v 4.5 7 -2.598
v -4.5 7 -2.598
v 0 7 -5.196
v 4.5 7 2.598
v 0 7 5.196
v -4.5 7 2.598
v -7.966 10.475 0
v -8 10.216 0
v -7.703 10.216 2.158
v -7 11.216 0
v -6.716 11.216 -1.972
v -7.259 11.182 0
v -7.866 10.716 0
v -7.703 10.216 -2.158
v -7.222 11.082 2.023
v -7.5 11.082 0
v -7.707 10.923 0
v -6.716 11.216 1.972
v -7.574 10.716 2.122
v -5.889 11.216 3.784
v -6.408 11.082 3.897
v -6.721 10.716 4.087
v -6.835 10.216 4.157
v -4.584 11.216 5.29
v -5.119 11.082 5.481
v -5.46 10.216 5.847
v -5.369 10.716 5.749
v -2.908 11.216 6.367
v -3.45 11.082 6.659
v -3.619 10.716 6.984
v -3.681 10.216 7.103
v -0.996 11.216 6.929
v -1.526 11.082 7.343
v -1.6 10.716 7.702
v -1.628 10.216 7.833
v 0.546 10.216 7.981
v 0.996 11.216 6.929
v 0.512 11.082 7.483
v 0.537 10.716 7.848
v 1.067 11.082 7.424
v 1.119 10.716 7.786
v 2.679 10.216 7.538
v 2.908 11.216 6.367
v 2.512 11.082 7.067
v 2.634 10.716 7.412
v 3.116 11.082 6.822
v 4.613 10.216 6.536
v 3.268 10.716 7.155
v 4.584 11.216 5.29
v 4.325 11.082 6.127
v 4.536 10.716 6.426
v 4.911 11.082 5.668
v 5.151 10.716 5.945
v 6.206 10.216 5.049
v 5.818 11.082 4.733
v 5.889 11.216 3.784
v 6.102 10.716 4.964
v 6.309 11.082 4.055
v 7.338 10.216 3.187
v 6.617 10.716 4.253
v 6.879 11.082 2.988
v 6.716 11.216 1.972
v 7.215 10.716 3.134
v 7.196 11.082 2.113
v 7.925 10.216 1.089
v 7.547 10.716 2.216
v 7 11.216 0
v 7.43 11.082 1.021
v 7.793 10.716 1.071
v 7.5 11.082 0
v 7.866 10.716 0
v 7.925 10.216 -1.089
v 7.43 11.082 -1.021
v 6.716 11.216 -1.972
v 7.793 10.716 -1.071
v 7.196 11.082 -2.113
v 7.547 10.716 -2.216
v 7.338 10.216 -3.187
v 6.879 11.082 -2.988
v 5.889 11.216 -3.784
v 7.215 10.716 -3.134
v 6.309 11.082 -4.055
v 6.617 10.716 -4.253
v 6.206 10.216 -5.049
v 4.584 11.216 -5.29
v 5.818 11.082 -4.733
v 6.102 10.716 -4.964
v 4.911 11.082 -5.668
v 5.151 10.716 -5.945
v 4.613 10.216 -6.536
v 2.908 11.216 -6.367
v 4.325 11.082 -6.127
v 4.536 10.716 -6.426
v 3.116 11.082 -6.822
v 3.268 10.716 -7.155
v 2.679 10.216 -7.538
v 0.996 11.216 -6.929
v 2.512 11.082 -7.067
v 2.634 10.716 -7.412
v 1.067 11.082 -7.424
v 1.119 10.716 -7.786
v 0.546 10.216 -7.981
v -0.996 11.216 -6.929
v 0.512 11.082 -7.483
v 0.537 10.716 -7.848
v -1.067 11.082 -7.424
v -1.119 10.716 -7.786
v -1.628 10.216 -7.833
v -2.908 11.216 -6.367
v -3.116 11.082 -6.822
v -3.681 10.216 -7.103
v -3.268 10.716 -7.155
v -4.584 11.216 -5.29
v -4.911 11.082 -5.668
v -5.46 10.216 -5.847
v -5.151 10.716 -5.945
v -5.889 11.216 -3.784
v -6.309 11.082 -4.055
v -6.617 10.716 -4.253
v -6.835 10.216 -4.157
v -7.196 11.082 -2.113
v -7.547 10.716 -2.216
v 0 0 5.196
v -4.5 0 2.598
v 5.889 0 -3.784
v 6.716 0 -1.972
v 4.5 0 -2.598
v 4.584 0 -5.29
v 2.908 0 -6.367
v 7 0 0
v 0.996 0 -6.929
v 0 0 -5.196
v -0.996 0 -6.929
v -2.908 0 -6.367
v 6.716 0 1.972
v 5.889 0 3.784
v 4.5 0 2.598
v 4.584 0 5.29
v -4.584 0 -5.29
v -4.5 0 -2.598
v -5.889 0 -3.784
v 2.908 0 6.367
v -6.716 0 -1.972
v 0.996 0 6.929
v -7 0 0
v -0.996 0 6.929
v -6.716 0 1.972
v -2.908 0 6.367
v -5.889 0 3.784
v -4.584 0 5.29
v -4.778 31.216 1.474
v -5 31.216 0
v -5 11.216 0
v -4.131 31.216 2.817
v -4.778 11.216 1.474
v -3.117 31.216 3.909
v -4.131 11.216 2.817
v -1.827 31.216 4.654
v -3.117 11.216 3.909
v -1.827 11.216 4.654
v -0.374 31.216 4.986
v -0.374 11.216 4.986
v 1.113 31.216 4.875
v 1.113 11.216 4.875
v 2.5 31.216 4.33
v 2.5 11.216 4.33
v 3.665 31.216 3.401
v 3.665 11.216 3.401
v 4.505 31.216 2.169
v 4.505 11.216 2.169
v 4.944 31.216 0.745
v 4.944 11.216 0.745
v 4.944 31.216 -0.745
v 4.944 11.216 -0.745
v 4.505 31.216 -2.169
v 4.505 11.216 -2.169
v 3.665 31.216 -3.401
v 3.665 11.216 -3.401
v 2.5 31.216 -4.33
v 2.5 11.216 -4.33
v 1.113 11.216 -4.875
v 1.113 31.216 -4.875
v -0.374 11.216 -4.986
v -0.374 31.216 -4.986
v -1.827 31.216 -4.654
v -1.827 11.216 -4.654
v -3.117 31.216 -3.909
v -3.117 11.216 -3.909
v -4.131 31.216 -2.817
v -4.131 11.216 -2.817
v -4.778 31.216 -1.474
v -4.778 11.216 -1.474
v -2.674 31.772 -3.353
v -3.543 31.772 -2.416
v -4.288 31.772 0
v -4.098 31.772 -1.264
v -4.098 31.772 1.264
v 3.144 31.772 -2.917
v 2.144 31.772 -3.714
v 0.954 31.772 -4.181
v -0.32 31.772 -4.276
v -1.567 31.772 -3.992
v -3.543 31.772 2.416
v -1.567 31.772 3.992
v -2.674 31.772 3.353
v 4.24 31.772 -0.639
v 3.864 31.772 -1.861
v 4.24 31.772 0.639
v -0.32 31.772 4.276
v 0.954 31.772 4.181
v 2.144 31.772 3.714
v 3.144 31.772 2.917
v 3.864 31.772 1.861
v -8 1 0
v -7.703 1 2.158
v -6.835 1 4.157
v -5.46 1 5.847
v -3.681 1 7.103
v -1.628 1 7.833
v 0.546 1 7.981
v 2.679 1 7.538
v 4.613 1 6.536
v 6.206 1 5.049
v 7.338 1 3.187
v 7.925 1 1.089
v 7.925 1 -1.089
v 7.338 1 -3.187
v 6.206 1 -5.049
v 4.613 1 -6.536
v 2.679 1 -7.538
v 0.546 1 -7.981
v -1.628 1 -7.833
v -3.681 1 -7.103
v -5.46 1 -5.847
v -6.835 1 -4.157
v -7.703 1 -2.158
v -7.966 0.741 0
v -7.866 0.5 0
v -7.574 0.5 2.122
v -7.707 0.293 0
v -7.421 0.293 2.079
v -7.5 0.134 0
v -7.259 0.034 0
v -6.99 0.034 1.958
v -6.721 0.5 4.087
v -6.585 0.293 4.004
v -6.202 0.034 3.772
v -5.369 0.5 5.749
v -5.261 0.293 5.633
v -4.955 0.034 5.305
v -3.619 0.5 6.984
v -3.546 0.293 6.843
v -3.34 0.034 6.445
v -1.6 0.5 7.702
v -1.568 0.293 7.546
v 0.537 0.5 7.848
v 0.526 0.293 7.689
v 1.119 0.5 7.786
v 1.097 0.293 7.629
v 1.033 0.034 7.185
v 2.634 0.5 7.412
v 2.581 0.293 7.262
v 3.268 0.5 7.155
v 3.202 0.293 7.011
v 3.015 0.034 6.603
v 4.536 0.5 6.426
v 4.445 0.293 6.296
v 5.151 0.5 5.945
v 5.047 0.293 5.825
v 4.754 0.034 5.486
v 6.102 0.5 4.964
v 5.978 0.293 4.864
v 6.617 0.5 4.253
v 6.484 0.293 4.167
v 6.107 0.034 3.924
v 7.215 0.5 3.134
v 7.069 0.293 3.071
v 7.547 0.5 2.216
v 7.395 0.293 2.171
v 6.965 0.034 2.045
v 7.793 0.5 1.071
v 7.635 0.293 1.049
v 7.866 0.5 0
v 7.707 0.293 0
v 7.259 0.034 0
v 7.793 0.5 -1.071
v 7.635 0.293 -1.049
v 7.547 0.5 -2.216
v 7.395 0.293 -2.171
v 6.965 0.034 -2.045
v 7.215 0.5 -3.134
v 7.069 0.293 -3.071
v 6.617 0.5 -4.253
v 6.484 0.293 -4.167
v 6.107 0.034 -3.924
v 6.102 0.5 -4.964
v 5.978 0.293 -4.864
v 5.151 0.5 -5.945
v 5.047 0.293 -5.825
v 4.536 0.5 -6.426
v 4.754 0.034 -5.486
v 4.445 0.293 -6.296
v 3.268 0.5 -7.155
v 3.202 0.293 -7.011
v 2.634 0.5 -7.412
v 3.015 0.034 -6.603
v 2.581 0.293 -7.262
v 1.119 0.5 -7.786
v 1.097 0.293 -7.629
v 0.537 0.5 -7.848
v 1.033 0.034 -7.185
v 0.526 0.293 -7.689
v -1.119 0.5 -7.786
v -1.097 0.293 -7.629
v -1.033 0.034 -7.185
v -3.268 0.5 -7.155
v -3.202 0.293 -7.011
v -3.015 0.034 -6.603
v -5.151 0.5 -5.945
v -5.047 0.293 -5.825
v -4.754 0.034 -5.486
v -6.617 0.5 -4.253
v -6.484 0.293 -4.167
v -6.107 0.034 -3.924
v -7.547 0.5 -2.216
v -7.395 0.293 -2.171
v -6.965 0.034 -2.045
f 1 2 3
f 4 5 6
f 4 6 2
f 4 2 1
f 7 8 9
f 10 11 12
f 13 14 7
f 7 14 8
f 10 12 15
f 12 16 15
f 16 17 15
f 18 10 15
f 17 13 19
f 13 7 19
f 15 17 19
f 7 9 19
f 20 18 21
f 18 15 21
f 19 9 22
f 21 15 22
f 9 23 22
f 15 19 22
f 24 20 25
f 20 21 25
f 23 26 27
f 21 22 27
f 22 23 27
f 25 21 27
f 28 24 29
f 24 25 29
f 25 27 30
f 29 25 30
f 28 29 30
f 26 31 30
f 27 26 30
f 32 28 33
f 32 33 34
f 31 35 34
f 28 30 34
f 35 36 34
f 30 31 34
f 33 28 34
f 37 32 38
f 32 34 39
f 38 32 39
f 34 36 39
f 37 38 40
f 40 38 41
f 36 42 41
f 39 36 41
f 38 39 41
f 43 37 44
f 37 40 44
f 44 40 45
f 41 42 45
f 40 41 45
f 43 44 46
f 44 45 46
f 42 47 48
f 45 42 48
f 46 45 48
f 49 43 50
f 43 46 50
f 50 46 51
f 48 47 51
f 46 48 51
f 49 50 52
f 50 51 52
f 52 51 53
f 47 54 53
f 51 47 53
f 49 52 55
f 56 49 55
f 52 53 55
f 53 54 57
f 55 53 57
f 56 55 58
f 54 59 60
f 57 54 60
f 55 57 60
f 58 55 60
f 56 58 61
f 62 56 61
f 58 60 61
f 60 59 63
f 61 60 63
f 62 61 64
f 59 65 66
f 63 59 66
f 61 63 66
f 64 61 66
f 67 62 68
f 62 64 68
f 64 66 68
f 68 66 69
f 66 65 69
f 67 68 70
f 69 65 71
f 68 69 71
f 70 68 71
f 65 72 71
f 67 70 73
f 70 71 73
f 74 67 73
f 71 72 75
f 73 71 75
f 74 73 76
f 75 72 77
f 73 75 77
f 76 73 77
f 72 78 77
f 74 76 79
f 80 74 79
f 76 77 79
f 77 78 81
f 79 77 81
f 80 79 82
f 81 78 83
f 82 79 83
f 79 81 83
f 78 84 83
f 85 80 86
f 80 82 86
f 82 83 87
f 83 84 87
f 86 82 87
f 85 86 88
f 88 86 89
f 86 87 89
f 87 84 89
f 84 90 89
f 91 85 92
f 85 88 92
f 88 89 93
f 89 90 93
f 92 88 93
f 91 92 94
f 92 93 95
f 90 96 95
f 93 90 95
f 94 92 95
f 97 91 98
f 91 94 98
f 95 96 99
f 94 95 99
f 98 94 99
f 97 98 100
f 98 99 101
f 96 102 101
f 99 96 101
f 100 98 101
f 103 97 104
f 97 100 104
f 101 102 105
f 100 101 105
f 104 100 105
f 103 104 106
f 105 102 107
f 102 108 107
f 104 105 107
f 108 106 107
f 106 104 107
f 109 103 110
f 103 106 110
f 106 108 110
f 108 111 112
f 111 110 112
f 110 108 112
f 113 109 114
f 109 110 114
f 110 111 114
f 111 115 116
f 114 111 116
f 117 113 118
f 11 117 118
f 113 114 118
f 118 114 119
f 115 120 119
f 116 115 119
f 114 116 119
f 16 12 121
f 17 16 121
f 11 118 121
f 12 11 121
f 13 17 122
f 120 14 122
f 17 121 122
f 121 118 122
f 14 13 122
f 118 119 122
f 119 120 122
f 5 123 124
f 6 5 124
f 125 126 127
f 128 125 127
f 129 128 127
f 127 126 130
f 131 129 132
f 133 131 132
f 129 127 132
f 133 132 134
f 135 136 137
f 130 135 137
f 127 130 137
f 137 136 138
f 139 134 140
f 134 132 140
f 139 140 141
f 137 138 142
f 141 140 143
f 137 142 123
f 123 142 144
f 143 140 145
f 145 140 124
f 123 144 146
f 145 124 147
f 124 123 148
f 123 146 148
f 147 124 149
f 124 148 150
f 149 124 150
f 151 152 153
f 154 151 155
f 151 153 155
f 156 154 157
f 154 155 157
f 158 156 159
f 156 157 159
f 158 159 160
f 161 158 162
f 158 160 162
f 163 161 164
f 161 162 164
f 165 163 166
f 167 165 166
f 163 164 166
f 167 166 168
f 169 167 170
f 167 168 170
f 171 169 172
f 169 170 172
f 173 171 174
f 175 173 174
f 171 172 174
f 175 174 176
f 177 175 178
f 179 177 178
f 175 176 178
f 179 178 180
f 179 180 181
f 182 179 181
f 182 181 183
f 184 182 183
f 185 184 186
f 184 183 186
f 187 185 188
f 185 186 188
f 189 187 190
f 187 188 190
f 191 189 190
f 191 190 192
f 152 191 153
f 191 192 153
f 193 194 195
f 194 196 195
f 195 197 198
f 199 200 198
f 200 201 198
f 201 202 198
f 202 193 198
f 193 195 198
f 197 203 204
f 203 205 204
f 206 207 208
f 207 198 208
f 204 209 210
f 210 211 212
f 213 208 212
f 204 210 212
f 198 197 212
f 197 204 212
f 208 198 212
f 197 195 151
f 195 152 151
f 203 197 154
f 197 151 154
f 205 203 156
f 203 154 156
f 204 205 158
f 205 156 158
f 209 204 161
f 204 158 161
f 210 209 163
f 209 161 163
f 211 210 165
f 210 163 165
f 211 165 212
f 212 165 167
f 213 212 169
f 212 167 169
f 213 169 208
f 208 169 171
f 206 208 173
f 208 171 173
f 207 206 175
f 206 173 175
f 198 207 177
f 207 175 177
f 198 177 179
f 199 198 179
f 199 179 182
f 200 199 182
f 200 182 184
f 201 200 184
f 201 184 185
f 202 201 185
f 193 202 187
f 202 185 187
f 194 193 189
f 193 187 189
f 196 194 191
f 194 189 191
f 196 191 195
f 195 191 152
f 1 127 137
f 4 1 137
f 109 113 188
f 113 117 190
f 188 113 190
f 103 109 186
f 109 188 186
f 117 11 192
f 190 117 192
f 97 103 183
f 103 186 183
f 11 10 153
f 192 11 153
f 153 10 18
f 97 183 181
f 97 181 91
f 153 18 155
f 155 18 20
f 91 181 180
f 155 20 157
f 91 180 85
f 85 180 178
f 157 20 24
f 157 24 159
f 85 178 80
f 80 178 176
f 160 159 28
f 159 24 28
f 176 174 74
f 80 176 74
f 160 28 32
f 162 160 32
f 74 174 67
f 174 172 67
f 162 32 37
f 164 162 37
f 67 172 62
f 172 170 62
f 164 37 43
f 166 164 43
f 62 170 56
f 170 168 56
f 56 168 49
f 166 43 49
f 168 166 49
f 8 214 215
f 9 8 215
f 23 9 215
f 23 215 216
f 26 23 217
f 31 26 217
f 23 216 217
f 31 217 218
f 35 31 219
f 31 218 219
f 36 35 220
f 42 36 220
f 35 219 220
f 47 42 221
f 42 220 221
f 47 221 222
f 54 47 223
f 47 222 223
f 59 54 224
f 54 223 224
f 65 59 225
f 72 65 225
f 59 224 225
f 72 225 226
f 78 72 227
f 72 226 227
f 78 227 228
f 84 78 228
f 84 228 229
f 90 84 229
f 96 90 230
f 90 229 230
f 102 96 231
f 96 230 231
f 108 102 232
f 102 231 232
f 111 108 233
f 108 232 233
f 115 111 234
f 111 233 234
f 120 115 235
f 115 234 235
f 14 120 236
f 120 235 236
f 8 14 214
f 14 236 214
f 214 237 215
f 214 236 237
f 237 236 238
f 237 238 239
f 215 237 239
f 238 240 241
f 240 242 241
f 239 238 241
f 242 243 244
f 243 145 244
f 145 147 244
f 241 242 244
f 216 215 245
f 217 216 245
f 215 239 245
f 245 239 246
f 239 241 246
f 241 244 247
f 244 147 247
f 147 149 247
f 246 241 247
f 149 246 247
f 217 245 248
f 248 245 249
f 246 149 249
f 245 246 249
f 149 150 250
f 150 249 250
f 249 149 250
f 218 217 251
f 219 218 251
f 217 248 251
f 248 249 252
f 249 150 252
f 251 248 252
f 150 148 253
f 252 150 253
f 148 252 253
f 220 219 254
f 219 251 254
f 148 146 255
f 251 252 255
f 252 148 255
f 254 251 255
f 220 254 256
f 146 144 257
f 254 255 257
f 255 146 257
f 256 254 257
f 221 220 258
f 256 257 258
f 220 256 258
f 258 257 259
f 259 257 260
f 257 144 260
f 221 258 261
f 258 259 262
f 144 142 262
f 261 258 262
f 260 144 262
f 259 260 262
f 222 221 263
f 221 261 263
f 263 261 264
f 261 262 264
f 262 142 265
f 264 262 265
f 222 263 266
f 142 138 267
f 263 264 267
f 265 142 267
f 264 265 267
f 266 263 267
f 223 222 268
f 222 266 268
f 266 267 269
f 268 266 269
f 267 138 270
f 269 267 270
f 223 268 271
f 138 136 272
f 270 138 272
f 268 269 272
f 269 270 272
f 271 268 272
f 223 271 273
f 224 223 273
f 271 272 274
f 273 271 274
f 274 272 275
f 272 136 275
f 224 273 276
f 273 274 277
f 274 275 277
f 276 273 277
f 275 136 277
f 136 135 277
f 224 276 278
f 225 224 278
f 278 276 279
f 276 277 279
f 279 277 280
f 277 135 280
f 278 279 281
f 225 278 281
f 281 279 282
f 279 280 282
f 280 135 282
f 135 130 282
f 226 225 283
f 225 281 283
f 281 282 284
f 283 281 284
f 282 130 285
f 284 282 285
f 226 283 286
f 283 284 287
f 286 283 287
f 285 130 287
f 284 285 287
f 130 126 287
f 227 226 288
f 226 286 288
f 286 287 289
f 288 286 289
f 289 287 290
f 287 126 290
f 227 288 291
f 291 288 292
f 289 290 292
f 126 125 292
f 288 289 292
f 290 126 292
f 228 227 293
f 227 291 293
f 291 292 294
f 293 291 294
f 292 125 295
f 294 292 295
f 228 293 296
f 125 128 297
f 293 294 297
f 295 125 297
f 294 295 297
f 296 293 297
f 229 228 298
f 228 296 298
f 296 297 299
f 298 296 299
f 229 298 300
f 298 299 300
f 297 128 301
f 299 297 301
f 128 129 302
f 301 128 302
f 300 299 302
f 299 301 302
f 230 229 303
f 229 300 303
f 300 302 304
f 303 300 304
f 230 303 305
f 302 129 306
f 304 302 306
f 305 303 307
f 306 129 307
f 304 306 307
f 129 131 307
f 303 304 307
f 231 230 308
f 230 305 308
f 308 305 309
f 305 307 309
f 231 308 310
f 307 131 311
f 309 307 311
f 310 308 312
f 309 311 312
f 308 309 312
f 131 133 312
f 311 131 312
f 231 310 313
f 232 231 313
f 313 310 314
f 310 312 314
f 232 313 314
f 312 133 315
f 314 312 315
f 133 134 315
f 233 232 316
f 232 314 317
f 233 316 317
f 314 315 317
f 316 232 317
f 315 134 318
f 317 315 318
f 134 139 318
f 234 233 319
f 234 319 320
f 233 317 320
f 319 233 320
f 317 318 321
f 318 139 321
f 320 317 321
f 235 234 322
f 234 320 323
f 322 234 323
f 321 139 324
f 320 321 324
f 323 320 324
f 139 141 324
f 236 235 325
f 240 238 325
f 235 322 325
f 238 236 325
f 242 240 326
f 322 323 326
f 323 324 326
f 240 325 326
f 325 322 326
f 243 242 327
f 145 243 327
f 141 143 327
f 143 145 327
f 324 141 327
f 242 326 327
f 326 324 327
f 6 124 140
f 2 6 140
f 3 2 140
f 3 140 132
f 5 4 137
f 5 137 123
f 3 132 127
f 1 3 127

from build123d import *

# Parameters (mm, degrees)
CORTAR_EXTRUIR1_DEPTH = 7
REDONDEO1_R           = 1


with BuildPart() as part:
    # Croquis1 → Revolución2 (revolve)
    with BuildSketch(Plane.XY):
        Polygon((-5, 31.216383588), (-5, 11.216383588), (-8, 11.216383588), (-8, 0), (0, 0), (0, 31.772433039), (-4.288289157, 31.772433039), align=None)
    revolve(axis=Axis((0, 0, 0), (0, 1, 0)))

    # Croquis2 → Cortar-Extruir1 (cut)
    with BuildSketch(Plane.XZ):
        Polygon((0, 5.196152423), (-4.5, 2.598076211), (-4.5, -2.598076211), (0, -5.196152423), (4.5, -2.598076211), (4.5, 2.598076211), align=None)
    extrude(amount=-CORTAR_EXTRUIR1_DEPTH, mode=Mode.SUBTRACT)

    # Redondeo1
    redondeo1_edges = [part.edges().sort_by_distance(p)[0] for p in [
        (8, 11.216383588, 0),
        (8, 0, 0),
    ]]
    fillet(redondeo1_edges, radius=REDONDEO1_R)


solid = part.part
